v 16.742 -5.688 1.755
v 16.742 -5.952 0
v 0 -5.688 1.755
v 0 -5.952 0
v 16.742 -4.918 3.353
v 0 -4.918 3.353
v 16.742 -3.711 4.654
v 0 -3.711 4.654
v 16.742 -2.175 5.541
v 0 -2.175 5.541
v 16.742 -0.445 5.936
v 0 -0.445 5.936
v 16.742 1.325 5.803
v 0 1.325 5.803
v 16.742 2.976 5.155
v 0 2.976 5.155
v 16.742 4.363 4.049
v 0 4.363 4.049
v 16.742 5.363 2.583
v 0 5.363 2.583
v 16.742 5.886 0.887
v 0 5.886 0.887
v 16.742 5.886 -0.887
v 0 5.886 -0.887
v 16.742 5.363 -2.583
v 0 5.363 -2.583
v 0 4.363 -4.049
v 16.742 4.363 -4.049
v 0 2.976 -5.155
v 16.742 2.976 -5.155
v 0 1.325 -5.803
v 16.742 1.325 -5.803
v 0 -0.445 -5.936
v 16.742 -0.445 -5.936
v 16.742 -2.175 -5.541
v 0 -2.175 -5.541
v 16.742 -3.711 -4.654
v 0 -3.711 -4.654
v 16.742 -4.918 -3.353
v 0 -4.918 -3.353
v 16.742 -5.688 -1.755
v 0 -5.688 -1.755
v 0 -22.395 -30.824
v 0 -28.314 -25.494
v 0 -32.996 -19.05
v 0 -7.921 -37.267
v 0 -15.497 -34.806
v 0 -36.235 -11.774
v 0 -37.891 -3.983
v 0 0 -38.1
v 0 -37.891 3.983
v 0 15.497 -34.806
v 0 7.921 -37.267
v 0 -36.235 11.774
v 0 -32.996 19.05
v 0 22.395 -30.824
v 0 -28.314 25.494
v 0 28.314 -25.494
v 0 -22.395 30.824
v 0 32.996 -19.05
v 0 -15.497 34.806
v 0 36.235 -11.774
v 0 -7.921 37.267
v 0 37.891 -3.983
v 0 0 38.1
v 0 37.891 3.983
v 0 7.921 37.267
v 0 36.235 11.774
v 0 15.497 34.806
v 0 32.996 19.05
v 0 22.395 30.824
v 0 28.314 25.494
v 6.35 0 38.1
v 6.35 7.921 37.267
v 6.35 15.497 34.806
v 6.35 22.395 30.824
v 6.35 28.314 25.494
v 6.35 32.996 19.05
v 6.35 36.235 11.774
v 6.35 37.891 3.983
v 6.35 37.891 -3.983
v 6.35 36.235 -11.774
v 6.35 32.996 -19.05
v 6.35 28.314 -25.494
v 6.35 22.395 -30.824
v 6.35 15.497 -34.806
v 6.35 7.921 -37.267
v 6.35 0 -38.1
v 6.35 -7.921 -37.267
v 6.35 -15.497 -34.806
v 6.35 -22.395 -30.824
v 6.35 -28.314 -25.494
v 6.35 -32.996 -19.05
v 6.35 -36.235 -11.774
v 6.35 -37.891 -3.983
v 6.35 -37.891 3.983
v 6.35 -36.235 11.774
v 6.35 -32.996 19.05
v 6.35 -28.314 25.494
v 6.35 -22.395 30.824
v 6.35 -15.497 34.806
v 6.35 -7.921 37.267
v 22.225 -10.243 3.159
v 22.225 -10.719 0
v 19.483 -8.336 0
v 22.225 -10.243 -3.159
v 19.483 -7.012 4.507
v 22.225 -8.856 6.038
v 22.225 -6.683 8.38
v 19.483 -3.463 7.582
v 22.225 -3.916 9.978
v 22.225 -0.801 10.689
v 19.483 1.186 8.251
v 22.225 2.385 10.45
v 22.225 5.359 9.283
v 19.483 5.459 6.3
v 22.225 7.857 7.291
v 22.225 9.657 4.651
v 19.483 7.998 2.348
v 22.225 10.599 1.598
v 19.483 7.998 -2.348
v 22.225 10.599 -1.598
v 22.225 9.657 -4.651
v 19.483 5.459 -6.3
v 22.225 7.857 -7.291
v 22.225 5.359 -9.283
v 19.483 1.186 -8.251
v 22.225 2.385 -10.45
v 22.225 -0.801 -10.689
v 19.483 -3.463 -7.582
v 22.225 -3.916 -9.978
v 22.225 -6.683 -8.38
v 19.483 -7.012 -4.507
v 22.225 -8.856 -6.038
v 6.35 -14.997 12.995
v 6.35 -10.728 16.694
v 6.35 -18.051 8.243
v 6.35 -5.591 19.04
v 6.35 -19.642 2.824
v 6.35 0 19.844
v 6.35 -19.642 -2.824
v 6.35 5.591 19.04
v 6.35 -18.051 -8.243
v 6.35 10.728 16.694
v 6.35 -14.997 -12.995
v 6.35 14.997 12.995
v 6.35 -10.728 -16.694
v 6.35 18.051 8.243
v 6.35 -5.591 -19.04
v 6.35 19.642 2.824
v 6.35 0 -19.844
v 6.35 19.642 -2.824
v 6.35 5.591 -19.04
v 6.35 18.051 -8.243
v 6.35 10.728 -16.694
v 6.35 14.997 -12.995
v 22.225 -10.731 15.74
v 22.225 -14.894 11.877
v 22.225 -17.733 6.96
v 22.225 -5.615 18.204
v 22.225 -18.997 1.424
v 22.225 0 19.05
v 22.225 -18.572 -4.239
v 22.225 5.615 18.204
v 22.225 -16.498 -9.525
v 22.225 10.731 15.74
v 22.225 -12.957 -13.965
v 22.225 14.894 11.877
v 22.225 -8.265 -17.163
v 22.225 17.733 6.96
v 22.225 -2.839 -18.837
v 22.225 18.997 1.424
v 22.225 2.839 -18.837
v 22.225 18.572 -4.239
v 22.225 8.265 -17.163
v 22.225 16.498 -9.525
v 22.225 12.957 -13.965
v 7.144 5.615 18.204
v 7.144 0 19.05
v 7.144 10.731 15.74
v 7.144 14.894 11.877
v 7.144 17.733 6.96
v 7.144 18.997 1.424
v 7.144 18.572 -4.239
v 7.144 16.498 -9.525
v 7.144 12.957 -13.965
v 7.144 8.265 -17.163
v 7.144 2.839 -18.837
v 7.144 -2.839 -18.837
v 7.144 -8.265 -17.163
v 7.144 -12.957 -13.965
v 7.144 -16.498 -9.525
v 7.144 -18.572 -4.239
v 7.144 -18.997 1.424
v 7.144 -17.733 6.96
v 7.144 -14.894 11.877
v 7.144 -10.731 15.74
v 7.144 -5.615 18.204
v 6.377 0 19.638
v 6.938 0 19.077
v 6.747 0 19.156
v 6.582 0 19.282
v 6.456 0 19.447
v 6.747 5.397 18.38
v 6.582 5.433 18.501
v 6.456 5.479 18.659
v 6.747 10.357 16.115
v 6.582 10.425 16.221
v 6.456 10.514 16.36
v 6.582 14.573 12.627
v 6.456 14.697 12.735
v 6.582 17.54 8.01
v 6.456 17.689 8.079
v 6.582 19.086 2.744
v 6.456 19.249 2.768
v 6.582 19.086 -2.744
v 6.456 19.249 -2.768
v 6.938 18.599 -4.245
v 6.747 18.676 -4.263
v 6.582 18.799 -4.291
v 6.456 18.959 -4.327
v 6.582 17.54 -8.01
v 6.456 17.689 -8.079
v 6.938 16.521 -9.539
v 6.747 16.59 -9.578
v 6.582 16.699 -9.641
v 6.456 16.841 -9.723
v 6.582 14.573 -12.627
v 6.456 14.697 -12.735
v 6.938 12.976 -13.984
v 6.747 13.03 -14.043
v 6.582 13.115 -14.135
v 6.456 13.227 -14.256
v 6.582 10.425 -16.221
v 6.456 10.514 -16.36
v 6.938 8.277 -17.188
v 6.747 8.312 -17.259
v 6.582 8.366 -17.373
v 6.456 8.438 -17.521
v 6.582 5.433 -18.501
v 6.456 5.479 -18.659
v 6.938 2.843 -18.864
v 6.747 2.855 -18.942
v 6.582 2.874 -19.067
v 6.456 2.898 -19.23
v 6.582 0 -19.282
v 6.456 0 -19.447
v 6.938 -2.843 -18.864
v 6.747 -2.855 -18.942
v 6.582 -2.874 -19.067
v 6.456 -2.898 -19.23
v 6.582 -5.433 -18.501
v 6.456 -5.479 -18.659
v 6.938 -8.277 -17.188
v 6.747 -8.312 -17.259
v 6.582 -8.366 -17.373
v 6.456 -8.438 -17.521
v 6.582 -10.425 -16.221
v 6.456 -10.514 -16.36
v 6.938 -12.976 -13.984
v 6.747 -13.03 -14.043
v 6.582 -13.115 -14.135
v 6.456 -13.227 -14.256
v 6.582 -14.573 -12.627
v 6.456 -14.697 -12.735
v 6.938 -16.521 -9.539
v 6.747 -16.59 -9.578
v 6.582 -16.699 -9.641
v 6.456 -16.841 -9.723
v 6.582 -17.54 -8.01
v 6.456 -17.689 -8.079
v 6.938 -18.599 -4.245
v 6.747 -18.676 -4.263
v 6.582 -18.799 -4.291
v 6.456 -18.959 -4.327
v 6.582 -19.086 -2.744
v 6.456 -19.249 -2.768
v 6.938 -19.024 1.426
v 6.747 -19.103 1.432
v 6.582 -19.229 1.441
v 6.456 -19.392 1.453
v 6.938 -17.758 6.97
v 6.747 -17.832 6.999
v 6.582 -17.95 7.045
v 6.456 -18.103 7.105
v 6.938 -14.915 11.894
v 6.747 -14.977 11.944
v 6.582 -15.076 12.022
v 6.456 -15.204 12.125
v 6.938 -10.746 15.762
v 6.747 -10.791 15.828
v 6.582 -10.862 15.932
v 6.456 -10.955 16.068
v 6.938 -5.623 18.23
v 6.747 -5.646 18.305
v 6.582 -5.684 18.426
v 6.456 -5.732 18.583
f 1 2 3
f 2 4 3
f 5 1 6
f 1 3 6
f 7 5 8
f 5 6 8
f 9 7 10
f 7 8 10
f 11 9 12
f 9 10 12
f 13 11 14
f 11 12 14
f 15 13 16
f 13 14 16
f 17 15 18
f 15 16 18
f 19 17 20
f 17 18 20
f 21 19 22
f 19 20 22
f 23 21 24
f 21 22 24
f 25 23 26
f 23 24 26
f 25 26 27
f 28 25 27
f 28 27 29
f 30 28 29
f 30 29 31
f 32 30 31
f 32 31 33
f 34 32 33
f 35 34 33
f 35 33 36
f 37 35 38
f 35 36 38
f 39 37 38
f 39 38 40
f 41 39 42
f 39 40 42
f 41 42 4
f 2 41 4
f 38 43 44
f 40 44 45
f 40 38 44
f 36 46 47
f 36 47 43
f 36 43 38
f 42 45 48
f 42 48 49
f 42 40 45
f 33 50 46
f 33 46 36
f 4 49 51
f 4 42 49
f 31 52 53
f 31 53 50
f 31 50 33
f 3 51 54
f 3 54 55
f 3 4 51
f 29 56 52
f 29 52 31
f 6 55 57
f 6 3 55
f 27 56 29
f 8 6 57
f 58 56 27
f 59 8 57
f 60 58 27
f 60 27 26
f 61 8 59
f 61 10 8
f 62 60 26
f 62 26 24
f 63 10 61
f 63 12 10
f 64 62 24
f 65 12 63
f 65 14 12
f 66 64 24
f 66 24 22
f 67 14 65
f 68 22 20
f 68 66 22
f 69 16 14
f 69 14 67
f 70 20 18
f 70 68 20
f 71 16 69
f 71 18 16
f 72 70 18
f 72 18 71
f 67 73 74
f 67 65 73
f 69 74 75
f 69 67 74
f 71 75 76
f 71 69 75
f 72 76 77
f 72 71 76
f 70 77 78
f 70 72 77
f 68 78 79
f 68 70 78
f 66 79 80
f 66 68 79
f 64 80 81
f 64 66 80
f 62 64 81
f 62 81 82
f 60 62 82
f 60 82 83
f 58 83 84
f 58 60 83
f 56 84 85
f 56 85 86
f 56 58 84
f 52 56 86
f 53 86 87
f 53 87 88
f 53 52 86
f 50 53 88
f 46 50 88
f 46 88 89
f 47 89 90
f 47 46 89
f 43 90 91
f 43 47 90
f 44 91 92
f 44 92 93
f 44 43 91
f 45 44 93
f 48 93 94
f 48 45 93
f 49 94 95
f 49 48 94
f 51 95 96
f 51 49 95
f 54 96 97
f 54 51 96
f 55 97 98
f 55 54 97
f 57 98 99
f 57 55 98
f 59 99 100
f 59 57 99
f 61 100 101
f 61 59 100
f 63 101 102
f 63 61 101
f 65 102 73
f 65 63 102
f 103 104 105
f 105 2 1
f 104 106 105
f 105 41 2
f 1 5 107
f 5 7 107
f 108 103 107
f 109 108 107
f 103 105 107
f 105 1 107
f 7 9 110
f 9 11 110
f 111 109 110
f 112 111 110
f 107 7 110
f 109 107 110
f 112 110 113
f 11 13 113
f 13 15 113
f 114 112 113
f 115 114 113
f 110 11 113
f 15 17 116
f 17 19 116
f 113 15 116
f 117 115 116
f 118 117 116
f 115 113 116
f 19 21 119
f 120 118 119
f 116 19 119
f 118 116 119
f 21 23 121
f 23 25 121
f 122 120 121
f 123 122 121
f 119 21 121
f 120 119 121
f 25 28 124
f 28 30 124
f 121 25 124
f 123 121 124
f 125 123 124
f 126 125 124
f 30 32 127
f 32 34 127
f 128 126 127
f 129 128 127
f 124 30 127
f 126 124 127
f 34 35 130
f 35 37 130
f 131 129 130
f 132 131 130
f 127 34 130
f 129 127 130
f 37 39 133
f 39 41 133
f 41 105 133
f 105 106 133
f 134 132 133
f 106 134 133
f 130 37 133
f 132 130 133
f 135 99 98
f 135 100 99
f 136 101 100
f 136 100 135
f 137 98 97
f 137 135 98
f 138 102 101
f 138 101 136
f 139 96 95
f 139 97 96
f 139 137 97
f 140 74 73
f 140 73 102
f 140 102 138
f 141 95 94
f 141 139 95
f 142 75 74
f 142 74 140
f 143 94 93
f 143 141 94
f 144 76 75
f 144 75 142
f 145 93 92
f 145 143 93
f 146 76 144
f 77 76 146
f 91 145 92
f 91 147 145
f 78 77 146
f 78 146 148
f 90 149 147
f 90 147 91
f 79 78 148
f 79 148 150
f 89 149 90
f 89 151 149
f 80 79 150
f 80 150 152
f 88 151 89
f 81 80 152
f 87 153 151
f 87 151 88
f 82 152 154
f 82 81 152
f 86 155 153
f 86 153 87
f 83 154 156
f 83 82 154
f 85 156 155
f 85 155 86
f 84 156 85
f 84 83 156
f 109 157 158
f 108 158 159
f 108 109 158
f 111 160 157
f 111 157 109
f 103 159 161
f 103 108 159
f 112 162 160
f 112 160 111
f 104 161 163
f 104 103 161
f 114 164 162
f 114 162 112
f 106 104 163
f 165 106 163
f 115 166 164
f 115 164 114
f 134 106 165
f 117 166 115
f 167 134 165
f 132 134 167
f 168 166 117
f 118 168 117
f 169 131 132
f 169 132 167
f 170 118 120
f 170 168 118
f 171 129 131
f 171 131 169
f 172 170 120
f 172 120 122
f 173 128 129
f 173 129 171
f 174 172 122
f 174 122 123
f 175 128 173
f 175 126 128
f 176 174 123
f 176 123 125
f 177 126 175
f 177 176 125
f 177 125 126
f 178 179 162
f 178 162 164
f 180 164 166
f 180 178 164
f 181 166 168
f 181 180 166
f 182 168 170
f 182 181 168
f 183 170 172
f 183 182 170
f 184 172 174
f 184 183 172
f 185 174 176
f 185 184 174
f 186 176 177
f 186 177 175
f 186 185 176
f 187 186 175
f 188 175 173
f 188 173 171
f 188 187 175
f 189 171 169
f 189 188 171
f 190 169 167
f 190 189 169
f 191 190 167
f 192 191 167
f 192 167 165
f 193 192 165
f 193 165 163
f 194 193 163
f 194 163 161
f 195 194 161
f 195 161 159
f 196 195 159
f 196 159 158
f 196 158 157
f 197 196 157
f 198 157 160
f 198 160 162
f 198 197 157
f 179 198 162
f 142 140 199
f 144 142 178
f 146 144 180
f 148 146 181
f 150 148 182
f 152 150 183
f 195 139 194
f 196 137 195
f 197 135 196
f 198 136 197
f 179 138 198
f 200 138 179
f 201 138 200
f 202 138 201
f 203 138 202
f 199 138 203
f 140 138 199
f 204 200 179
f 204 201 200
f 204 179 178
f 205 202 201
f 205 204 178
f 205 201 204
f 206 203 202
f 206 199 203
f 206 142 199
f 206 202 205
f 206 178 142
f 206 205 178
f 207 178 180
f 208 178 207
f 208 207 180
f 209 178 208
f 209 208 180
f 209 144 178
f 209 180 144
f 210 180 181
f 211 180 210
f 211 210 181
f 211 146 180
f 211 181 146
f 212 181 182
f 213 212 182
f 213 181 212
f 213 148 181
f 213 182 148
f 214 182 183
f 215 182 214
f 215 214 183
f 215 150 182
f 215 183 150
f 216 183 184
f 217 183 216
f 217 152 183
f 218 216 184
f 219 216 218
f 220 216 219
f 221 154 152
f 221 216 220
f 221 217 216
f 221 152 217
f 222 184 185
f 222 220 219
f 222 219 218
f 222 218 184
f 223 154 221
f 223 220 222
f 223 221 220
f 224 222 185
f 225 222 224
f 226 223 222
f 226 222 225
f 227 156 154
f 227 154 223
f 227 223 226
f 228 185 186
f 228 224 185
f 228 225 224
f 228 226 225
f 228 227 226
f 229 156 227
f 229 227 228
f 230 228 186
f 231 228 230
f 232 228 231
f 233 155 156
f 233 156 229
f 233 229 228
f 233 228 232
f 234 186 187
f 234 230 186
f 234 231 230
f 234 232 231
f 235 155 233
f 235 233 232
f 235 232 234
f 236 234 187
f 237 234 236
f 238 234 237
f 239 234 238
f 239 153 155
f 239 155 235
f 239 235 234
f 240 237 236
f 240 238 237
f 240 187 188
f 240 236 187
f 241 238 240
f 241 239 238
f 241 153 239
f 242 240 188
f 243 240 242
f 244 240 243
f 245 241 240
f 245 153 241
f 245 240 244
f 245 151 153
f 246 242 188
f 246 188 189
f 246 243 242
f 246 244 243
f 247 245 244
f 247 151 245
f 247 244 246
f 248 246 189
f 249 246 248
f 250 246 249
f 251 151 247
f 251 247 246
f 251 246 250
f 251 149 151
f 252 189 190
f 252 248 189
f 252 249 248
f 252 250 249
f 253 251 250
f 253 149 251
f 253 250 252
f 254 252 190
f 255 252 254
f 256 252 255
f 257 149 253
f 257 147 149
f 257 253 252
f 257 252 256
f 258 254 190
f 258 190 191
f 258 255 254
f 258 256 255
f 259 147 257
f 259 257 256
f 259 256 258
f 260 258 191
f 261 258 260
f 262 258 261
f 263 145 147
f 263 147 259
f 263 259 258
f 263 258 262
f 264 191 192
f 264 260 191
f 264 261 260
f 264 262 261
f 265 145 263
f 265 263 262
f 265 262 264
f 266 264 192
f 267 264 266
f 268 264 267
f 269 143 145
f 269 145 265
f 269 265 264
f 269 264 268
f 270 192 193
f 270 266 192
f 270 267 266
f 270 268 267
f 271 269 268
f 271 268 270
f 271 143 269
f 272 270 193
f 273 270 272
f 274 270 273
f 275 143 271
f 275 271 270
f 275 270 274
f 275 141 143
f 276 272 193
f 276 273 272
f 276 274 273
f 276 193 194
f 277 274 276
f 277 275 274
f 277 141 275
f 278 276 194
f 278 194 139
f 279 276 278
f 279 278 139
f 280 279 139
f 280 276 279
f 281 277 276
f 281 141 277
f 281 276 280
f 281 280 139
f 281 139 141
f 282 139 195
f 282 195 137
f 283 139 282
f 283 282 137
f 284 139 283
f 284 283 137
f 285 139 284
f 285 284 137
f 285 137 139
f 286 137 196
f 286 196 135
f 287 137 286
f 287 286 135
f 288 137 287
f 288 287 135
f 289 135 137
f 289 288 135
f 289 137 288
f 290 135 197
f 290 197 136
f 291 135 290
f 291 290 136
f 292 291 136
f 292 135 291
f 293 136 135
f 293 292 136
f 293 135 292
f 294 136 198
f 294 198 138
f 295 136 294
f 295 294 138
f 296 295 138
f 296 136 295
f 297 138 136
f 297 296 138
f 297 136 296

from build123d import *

# Parameters (mm, degrees)
F2_R           = 0.79375
F4_D           = 11.90498
F4_CSINK_D     = 21.4376
F4_CSINK_ANGLE = 82


with BuildPart() as f1:
    # F0 (on Front) → F1 (revolve)
    with BuildSketch(Plane.XZ):
        Polygon((6.35, 38.1), (0, 38.1), (0, 0), (22.225, 0), (22.225, 19.05), (6.35, 19.05), align=None)
    revolve(axis=Axis((11.1125, 0, 0), (-1, 0, 0)))

    # F2
    f2_edges = [f1.edges().sort_by_distance(p)[0] for p in [
        (6.35, 0, -19.05),
    ]]
    fillet(f2_edges, radius=F2_R)

    # F4 (through all)
    with Locations(Plane.YZ.offset(22.225)):
        with Locations((0, 0)):
            CounterSinkHole(F4_D / 2, F4_CSINK_D / 2, counter_sink_angle=F4_CSINK_ANGLE)


solid = f1.part
